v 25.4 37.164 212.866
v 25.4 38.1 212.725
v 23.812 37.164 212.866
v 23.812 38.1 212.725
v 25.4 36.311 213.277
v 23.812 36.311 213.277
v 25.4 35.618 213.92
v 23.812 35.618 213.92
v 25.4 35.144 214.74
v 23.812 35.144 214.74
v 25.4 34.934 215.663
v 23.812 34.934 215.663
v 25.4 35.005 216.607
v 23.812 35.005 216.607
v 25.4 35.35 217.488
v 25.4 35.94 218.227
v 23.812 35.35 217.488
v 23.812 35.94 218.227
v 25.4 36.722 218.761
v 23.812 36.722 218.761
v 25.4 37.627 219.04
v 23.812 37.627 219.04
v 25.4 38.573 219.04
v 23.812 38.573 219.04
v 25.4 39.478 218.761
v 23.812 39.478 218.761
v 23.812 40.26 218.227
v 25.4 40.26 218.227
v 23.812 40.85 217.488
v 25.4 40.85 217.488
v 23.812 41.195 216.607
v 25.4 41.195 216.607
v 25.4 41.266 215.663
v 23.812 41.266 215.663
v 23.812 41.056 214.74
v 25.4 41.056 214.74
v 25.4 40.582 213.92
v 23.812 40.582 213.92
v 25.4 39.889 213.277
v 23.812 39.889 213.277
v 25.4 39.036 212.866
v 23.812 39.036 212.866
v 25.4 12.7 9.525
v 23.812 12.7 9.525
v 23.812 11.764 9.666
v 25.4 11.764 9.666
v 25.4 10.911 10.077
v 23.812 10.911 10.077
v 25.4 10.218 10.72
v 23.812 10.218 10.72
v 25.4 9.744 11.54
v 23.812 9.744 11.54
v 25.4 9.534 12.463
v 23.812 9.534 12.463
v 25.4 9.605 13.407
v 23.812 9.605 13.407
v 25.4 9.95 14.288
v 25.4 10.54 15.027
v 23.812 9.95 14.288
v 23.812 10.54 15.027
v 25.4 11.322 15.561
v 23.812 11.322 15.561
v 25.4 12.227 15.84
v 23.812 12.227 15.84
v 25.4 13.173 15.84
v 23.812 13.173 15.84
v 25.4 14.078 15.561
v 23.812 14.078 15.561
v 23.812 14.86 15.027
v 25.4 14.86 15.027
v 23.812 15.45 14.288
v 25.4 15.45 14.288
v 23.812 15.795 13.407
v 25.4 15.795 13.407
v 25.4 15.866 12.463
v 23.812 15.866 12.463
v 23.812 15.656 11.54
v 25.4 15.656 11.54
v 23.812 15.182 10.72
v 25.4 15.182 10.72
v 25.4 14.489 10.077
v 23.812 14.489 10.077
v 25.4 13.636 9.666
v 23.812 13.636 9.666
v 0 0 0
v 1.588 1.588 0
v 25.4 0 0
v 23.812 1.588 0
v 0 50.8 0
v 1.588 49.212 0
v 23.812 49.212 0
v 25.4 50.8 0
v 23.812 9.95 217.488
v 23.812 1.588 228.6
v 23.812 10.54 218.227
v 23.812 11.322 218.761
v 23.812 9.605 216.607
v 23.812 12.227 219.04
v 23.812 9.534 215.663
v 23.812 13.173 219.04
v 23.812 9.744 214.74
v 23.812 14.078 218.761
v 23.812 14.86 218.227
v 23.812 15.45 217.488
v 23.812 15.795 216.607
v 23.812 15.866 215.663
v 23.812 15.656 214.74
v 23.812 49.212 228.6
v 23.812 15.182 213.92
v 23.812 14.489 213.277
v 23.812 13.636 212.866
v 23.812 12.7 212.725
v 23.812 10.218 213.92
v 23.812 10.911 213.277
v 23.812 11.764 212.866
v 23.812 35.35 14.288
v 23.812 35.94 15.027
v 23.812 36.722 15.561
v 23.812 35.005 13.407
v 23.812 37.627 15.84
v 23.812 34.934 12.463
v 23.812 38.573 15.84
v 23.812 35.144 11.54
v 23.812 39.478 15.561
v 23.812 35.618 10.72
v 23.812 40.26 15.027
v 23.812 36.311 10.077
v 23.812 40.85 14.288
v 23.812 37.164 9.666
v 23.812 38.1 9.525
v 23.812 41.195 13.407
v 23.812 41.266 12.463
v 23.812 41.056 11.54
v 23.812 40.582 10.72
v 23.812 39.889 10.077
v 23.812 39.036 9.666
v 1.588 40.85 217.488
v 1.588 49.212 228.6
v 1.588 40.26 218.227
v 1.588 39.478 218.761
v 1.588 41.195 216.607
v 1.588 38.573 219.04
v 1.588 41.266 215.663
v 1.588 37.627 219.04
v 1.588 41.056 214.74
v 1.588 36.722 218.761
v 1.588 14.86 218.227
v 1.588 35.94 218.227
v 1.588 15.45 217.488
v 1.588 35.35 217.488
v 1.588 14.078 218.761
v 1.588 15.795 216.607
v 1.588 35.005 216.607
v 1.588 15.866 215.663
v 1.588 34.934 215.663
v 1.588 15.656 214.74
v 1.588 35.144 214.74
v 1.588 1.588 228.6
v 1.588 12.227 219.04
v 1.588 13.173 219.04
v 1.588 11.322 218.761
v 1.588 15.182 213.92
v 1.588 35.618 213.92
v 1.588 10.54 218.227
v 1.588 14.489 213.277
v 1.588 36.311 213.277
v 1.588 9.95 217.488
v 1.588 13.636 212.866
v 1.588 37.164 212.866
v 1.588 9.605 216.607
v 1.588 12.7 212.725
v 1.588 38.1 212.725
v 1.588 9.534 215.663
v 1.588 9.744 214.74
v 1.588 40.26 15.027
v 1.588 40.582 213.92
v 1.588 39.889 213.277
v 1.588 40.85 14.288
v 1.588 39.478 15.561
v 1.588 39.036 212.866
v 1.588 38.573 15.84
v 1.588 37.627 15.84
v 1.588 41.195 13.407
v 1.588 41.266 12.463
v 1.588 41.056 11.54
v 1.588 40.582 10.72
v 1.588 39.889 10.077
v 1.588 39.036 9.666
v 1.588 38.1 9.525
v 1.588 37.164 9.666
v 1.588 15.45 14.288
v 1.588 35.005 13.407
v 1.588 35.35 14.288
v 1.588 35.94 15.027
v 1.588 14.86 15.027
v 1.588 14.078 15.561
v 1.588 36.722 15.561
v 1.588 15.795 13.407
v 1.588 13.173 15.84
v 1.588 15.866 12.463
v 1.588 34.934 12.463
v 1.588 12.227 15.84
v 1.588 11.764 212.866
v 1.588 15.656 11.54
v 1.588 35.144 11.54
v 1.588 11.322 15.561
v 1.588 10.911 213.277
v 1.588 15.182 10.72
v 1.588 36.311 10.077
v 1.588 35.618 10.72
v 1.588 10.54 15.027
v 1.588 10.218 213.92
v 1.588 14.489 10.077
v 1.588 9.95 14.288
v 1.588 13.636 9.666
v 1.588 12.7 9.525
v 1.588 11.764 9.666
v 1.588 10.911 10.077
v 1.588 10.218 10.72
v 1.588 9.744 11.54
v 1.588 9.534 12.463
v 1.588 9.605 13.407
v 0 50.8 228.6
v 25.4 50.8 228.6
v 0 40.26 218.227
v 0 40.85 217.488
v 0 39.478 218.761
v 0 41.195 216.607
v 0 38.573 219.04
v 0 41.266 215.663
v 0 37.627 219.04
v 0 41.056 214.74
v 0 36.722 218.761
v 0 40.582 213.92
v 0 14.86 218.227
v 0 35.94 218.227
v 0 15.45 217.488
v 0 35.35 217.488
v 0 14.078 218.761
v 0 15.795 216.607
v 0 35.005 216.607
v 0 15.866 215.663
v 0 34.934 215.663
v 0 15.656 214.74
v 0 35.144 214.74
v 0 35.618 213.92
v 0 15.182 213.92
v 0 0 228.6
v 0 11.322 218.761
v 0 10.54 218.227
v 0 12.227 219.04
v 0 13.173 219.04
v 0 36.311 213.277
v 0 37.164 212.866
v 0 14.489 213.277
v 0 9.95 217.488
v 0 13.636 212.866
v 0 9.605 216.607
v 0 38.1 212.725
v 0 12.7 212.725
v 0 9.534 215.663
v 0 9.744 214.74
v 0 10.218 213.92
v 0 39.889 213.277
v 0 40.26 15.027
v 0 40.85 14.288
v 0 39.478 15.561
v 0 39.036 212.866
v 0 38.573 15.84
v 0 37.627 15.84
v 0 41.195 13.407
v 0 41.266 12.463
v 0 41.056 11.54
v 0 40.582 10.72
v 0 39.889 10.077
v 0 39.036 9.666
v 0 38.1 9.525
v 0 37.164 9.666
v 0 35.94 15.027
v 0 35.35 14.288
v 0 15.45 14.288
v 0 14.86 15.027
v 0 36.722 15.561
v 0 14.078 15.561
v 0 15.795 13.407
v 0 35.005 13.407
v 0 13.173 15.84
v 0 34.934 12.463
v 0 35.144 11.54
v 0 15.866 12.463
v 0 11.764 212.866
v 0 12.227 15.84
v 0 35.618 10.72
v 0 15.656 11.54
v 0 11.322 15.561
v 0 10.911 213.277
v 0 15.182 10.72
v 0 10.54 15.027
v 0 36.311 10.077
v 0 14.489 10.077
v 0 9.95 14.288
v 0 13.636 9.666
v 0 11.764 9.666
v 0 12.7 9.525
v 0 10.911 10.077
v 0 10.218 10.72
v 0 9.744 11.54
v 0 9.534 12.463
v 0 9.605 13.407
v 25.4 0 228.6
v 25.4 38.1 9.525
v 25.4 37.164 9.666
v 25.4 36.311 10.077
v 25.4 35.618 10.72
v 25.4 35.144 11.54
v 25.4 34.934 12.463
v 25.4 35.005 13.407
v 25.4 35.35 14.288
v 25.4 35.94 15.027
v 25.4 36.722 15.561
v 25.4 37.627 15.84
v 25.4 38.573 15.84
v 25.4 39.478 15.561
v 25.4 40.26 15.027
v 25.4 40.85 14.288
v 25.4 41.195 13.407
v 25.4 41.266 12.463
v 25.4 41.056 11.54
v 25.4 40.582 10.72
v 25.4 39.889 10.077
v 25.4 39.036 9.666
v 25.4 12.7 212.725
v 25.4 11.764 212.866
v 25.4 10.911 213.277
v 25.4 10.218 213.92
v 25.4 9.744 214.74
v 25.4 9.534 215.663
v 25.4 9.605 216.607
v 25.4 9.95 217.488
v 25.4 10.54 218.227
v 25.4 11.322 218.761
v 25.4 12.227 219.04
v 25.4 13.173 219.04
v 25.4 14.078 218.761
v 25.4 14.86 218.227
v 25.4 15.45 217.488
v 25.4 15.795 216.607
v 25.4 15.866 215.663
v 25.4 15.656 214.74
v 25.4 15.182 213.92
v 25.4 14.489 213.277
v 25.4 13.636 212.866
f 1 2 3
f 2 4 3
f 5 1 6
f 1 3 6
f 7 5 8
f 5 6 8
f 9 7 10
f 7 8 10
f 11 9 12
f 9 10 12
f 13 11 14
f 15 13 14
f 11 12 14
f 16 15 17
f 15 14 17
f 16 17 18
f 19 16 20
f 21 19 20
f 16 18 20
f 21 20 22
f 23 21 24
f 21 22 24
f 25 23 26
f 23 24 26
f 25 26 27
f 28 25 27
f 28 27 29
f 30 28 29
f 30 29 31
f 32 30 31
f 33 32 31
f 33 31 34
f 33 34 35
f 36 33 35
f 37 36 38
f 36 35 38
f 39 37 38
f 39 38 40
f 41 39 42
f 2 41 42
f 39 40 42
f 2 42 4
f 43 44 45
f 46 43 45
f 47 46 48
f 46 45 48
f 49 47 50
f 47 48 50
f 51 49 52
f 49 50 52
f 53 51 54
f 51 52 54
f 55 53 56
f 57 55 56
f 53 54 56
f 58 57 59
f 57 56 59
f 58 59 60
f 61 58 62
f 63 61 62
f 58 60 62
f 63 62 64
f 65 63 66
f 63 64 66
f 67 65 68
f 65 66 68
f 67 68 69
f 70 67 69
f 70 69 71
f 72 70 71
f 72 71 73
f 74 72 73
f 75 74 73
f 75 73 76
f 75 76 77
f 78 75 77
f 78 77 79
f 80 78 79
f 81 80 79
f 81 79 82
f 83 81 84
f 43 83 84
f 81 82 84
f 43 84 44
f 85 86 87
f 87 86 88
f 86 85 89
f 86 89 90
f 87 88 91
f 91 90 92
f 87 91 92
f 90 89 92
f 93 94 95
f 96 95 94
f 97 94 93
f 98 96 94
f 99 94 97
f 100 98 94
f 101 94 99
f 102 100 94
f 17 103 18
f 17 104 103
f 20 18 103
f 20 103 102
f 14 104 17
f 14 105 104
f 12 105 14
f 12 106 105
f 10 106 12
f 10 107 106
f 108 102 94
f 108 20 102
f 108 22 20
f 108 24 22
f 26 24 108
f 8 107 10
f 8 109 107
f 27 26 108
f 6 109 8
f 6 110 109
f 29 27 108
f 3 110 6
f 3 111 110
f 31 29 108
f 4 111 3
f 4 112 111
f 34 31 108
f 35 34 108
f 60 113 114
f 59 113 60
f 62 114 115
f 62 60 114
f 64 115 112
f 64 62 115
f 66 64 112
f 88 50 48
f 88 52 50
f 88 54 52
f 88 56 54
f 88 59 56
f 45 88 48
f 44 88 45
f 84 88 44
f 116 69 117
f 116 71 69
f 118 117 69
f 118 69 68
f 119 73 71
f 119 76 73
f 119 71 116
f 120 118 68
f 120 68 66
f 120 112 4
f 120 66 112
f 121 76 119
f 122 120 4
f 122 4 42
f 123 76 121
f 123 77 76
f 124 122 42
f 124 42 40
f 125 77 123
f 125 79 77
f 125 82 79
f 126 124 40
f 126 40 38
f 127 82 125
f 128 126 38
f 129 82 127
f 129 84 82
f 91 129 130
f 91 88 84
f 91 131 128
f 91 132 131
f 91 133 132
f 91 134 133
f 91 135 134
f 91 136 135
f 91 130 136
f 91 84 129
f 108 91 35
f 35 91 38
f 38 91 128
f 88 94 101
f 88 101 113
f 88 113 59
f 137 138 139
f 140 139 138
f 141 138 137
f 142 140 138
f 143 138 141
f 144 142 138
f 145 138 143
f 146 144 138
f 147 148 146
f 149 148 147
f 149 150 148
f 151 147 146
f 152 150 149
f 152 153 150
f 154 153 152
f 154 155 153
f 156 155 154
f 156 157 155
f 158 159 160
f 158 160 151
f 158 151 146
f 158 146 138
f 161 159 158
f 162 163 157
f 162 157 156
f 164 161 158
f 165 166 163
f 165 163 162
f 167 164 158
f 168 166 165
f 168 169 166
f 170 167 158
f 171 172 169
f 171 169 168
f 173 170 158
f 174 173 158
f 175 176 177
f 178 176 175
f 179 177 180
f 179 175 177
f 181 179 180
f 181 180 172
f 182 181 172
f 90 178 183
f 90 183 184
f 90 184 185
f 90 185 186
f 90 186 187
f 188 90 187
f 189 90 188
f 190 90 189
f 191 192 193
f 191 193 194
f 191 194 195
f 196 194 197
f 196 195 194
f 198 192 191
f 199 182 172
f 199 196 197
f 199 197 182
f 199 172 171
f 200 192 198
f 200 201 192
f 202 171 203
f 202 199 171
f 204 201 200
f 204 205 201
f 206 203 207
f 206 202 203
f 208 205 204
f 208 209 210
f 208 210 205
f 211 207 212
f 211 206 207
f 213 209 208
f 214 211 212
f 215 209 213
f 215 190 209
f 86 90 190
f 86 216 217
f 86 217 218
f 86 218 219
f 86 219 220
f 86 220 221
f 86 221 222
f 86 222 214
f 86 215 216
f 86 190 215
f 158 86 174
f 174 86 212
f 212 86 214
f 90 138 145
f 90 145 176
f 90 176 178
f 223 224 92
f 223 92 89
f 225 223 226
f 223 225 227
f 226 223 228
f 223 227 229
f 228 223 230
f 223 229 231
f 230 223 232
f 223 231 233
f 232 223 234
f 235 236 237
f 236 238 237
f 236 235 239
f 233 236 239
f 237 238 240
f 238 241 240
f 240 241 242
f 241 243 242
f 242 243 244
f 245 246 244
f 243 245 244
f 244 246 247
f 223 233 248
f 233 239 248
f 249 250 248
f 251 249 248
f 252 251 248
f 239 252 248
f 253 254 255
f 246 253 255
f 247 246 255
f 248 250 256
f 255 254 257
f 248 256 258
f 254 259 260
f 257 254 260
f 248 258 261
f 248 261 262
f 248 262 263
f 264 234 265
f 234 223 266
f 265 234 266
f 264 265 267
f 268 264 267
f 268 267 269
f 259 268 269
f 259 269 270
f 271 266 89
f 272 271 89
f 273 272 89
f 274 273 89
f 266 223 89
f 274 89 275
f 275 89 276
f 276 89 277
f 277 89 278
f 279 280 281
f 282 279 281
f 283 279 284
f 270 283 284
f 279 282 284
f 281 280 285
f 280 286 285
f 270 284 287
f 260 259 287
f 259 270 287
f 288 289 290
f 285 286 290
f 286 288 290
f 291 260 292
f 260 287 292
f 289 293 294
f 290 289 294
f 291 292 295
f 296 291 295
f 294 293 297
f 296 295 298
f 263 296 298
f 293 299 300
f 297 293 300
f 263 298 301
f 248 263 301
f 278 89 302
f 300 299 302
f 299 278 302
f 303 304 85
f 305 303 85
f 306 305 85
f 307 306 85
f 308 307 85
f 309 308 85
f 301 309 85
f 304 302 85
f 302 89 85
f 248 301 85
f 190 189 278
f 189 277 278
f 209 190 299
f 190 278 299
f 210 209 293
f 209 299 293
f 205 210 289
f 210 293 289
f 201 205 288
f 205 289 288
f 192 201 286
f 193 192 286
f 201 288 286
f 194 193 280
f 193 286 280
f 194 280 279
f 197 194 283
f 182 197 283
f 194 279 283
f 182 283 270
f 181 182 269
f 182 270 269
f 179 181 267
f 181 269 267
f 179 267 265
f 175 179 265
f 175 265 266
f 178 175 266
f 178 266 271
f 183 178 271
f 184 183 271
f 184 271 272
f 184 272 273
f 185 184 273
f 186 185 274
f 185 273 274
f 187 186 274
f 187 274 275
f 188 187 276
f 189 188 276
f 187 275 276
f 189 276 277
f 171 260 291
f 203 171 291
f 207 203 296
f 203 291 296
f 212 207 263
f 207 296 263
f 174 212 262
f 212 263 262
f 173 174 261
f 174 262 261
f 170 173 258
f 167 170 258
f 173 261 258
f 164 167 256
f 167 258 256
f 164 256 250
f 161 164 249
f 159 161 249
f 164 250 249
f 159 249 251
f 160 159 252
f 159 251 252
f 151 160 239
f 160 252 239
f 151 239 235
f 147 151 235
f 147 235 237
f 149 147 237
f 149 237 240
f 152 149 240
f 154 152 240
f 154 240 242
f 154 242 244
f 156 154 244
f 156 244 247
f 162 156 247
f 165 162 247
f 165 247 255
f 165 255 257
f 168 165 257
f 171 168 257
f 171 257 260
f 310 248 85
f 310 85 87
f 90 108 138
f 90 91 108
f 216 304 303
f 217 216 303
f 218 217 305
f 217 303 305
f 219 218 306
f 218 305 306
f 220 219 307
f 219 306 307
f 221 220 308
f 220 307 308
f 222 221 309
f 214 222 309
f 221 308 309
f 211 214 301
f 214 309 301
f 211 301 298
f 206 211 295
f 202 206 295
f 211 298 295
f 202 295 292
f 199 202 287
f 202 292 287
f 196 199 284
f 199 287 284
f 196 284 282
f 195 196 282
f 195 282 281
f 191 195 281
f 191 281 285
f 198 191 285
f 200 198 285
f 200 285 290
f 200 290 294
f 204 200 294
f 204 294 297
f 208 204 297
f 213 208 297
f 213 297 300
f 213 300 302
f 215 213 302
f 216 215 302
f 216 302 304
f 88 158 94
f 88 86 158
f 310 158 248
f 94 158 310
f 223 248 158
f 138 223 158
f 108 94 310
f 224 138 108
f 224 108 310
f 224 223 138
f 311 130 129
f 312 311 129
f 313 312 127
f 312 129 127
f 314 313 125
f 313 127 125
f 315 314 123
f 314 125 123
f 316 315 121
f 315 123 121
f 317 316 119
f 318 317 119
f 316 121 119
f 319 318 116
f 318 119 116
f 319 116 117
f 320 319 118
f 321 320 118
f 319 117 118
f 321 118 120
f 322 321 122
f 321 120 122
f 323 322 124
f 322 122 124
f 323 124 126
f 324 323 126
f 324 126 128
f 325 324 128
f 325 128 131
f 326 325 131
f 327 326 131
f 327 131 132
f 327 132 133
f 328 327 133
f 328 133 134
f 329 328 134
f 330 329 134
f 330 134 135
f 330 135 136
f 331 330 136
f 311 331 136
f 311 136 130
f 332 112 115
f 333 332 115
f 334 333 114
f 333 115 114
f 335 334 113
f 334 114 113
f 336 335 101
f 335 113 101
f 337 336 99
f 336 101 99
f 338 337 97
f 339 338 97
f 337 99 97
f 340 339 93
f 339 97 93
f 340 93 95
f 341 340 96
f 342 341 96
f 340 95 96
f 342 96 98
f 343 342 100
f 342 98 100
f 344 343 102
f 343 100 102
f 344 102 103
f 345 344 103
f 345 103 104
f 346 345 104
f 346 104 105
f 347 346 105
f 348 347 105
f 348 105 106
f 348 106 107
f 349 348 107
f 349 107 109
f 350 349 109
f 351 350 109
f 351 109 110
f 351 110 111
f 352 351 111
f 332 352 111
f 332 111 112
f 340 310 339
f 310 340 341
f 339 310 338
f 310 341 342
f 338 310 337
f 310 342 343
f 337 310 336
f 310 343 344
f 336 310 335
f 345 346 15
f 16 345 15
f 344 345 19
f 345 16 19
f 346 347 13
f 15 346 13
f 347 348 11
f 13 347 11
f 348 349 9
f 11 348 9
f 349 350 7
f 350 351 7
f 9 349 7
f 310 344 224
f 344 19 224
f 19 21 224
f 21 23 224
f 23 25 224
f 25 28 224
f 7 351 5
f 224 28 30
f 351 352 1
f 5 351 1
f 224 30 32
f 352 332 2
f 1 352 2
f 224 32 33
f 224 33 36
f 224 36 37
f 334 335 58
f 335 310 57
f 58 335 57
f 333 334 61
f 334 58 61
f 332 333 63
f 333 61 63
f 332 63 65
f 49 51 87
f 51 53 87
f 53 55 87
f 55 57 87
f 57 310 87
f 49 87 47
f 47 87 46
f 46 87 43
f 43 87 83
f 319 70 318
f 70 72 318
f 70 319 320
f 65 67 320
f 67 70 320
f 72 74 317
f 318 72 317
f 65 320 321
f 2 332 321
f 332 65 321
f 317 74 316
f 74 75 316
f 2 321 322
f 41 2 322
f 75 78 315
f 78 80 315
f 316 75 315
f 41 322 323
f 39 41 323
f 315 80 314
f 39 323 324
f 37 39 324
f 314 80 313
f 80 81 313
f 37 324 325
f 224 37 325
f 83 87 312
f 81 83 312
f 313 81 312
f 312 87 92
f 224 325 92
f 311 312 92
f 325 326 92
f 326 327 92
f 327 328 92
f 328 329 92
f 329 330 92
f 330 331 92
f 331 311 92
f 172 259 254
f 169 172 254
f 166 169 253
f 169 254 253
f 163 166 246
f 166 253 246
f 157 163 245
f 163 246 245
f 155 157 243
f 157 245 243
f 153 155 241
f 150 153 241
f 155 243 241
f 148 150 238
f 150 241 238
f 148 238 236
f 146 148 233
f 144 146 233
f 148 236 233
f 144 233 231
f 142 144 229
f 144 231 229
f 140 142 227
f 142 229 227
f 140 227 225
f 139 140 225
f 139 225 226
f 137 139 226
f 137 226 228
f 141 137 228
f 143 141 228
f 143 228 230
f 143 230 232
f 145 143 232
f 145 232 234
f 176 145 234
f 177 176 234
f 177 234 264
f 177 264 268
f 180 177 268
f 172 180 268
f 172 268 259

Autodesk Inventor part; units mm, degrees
ref_plane "YZ Plane" through (0, 0, 0) normal (1, 0, 0) x (0, 1, 0)
ref_plane "XZ Plane" through (0, 0, 0) normal (0, 1, 0) x (-1, 0, 0)
ref_plane "XY Plane" through (0, 0, 0) normal (0, 0, 1) x (1, 0, 0)
sketch "Sketch1" plane through (0, 0, 0) normal (0, 0, 1) x (1, 0, 0)
  line L0 (0, 0) -> (25.4, 0)
  line L1 (25.4, 0) -> (25.4, 50.8)
  line L2 (25.4, 50.8) -> (0, 50.8)
  line L3 (0, 50.8) -> (0, 0)
  dimension "d0" = 25.4
  dimension "d1" = 50.8
extrude "Extrusion1" add sketch "Sketch1" along normal blind 228.6
shell "Shell1" thickness 1.5875 removed faces 2 at (8.4667, 33.8667, 0) at (8.4667, 33.8667, 228.6)
hole "Hole1" at (25.4, 38.1, 215.9) direction (-1, 0, 0) diameter 6.35 end through all
hole "Hole2" at (25.4, 12.7, 215.9) direction (-1, 0, 0) diameter 6.35 end through all
hole "Hole3" at (25.4, 38.1, 12.7) direction (-1, 0, 0) diameter 6.35 end through all
hole "Hole4" at (25.4, 12.7, 12.7) direction (-1, 0, 0) diameter 6.35 end through all
properties part number "Flywheel Roller Right Side Support Beam"
